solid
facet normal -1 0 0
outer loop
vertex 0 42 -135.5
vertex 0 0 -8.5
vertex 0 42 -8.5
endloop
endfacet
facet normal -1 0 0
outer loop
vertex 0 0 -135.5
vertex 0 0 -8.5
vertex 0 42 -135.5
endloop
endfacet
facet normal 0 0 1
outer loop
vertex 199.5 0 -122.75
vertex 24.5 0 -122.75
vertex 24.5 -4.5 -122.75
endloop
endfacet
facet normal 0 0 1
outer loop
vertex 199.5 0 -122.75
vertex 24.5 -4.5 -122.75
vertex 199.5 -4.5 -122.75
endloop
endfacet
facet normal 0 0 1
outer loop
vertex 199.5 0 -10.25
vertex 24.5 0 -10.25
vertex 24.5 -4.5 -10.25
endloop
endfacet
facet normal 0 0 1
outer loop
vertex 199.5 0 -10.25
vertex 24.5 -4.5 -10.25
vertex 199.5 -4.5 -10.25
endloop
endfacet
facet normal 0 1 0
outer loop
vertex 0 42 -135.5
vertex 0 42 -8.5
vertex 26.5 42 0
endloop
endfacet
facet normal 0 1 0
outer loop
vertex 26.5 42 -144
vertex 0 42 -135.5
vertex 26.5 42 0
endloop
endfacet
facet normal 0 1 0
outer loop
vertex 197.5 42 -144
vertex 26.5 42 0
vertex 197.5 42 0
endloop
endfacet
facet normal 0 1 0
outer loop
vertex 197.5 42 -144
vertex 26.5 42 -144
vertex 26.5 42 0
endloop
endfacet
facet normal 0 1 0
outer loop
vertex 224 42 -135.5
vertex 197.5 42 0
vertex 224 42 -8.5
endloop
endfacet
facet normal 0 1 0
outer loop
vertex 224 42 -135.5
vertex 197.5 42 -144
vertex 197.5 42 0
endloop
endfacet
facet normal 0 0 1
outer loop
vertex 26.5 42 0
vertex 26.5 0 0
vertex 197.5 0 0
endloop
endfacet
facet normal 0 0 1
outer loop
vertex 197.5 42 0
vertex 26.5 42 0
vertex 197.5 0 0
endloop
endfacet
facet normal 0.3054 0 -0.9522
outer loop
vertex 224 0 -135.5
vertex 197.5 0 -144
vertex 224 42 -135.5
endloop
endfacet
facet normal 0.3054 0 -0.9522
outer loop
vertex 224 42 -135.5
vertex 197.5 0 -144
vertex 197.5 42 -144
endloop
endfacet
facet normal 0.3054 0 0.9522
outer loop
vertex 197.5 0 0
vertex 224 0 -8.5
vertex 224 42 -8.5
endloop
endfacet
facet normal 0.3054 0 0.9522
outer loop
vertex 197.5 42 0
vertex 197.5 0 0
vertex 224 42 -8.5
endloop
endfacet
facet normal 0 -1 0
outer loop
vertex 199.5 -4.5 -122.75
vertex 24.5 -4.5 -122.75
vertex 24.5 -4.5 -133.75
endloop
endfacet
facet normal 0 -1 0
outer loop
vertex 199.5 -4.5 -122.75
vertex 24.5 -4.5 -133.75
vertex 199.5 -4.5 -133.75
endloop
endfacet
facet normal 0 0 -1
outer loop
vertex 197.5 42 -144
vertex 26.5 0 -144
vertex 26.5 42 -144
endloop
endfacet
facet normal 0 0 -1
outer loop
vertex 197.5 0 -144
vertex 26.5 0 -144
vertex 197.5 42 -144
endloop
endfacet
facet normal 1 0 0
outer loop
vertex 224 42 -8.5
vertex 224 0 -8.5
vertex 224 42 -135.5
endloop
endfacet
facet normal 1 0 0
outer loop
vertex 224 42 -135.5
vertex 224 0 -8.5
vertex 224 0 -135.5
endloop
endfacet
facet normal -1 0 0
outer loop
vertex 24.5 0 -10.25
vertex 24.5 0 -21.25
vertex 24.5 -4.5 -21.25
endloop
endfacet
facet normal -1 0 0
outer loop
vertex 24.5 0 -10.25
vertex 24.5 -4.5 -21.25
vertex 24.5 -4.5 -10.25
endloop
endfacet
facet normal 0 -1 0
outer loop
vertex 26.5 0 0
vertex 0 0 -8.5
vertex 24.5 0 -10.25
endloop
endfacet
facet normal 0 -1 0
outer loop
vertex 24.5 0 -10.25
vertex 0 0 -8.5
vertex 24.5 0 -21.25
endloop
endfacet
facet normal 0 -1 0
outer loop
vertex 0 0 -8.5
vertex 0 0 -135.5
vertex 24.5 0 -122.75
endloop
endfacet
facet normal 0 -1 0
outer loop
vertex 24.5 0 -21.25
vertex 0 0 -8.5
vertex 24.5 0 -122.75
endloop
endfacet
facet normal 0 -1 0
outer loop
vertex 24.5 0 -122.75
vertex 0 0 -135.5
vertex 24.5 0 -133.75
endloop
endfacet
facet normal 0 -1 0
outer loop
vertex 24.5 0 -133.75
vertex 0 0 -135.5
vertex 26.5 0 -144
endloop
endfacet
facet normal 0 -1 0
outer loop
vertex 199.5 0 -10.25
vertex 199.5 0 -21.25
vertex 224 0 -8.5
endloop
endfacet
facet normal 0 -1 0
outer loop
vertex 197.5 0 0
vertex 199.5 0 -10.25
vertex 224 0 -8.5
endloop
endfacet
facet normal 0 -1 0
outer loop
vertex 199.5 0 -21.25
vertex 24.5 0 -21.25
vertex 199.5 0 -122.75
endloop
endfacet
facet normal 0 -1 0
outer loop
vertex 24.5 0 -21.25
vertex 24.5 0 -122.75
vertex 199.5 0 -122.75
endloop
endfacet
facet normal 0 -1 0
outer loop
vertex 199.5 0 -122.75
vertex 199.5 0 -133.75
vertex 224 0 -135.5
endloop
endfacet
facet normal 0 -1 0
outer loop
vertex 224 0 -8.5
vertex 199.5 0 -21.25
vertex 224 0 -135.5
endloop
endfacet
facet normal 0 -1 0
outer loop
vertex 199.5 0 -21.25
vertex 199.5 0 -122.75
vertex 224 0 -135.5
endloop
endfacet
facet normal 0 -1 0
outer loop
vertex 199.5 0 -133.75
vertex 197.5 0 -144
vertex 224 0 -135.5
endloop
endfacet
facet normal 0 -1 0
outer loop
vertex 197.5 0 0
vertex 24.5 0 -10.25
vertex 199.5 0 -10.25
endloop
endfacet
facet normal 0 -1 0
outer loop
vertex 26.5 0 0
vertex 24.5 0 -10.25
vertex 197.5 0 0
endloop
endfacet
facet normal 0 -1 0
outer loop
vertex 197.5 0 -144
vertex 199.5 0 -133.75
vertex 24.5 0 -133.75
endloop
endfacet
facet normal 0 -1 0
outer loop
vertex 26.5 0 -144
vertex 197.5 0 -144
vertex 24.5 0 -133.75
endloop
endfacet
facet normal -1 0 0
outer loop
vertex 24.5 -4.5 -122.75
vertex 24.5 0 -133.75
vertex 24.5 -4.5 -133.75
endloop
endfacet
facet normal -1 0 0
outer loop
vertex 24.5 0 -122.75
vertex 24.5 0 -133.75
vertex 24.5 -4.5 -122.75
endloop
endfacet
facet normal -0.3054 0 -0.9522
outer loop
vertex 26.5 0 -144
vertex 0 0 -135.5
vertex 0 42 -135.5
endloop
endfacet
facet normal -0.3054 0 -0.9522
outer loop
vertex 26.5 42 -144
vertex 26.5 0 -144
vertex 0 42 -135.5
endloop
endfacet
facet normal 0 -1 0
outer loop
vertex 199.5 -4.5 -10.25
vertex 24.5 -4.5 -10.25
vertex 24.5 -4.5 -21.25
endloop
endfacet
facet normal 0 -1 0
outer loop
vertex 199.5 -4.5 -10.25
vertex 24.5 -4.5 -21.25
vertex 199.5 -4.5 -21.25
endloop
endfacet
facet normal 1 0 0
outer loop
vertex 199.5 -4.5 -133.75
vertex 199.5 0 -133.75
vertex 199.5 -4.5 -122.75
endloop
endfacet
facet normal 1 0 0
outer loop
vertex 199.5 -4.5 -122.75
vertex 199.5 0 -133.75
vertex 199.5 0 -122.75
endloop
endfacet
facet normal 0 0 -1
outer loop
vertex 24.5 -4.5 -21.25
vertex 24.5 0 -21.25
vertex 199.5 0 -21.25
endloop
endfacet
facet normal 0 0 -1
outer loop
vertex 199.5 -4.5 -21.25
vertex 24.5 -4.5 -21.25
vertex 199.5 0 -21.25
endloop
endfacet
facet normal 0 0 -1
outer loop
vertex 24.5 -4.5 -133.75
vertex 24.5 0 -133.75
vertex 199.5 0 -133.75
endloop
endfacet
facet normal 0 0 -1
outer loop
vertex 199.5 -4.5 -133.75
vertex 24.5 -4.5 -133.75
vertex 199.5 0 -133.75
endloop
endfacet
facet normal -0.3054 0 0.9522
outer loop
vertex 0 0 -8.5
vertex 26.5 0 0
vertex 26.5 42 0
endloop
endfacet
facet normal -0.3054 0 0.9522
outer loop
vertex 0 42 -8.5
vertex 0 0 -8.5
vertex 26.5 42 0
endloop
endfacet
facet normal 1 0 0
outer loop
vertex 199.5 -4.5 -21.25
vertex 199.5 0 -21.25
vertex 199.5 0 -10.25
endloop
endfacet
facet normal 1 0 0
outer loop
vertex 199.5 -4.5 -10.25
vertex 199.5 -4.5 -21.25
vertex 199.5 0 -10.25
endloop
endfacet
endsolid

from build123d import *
from OCP.BRepFilletAPI import BRepFilletAPI_MakeChamfer

# Parameters (mm, degrees)
SKETCH1_W           = 224
SKETCH1_H           = 144
BOSS_EXTRUDE1_DEPTH = 42
SKETCH2_W           = 175
SKETCH2_H           = 11
BOSS_EXTRUDE2_DEPTH = 4.5
CHAMFER1_SIZE       = 8.5
CHAMFER1_SIZE2      = 26.5
CHAMFER2_SIZE       = 26.5
CHAMFER2_SIZE2      = 8.5


with BuildPart() as part:
    # Sketch1 → Boss-Extrude1 (new body)
    with BuildSketch(Plane(origin=(0, 0, 0), x_dir=(1, 0, 0), z_dir=(0, 1, 0))):
        with Locations((112, 72)):
            Rectangle(SKETCH1_W, SKETCH1_H)
    extrude(amount=BOSS_EXTRUDE1_DEPTH)

    # Sketch2 → Boss-Extrude2 (add)
    with BuildSketch(Plane.XZ):
        with Locations((112, -128.25)):
            Rectangle(SKETCH2_W, SKETCH2_H)
        with Locations((112, -15.75)):
            Rectangle(SKETCH2_W, SKETCH2_H)
    extrude(amount=BOSS_EXTRUDE2_DEPTH)

    # Chamfer1: one chamfer whose edges measure the first distance from different faces: ONE call of the kernel's chamfer builder (chamfer() names one face for all edges)
    chamfer1_edges_1 = [part.edges().sort_by_distance(p)[0] for p in [
        (224, 21, -144),
    ]]
    chamfer1_side_1 = [part.faces().sort_by_distance(p)[0] for p in [
        (224, 21, -72),
    ]]
    chamfer1_edges_2 = [part.edges().sort_by_distance(p)[0] for p in [
        (0, 21, 0),
    ]]
    chamfer1_side_2 = [part.faces().sort_by_distance(p)[0] for p in [
        (0, 21, -72),
    ]]
    chamfer1 = BRepFilletAPI_MakeChamfer(part.part.solid().wrapped)
    for e in chamfer1_edges_1:
        chamfer1.Add(CHAMFER1_SIZE, CHAMFER1_SIZE2, e.wrapped, chamfer1_side_1[0].wrapped)  # the first distance lies on this face
    for e in chamfer1_edges_2:
        chamfer1.Add(CHAMFER1_SIZE, CHAMFER1_SIZE2, e.wrapped, chamfer1_side_2[0].wrapped)  # the first distance lies on this face
    add(Compound.cast(chamfer1.Shape()), mode=Mode.REPLACE)

    # Chamfer2: one chamfer whose edges measure the first distance from different faces: ONE call of the kernel's chamfer builder (chamfer() names one face for all edges)
    chamfer2_edges_1 = [part.edges().sort_by_distance(p)[0] for p in [
        (0, 21, -144),
    ]]
    chamfer2_side_1 = [part.faces().sort_by_distance(p)[0] for p in [
        (98.75, 21, -144),
    ]]
    chamfer2_edges_2 = [part.edges().sort_by_distance(p)[0] for p in [
        (224, 21, 0),
    ]]
    chamfer2_side_2 = [part.faces().sort_by_distance(p)[0] for p in [
        (125.25, 21, 0),
    ]]
    chamfer2 = BRepFilletAPI_MakeChamfer(part.part.solid().wrapped)
    for e in chamfer2_edges_1:
        chamfer2.Add(CHAMFER2_SIZE, CHAMFER2_SIZE2, e.wrapped, chamfer2_side_1[0].wrapped)  # the first distance lies on this face
    for e in chamfer2_edges_2:
        chamfer2.Add(CHAMFER2_SIZE, CHAMFER2_SIZE2, e.wrapped, chamfer2_side_2[0].wrapped)  # the first distance lies on this face
    add(Compound.cast(chamfer2.Shape()), mode=Mode.REPLACE)


solid = part.part
